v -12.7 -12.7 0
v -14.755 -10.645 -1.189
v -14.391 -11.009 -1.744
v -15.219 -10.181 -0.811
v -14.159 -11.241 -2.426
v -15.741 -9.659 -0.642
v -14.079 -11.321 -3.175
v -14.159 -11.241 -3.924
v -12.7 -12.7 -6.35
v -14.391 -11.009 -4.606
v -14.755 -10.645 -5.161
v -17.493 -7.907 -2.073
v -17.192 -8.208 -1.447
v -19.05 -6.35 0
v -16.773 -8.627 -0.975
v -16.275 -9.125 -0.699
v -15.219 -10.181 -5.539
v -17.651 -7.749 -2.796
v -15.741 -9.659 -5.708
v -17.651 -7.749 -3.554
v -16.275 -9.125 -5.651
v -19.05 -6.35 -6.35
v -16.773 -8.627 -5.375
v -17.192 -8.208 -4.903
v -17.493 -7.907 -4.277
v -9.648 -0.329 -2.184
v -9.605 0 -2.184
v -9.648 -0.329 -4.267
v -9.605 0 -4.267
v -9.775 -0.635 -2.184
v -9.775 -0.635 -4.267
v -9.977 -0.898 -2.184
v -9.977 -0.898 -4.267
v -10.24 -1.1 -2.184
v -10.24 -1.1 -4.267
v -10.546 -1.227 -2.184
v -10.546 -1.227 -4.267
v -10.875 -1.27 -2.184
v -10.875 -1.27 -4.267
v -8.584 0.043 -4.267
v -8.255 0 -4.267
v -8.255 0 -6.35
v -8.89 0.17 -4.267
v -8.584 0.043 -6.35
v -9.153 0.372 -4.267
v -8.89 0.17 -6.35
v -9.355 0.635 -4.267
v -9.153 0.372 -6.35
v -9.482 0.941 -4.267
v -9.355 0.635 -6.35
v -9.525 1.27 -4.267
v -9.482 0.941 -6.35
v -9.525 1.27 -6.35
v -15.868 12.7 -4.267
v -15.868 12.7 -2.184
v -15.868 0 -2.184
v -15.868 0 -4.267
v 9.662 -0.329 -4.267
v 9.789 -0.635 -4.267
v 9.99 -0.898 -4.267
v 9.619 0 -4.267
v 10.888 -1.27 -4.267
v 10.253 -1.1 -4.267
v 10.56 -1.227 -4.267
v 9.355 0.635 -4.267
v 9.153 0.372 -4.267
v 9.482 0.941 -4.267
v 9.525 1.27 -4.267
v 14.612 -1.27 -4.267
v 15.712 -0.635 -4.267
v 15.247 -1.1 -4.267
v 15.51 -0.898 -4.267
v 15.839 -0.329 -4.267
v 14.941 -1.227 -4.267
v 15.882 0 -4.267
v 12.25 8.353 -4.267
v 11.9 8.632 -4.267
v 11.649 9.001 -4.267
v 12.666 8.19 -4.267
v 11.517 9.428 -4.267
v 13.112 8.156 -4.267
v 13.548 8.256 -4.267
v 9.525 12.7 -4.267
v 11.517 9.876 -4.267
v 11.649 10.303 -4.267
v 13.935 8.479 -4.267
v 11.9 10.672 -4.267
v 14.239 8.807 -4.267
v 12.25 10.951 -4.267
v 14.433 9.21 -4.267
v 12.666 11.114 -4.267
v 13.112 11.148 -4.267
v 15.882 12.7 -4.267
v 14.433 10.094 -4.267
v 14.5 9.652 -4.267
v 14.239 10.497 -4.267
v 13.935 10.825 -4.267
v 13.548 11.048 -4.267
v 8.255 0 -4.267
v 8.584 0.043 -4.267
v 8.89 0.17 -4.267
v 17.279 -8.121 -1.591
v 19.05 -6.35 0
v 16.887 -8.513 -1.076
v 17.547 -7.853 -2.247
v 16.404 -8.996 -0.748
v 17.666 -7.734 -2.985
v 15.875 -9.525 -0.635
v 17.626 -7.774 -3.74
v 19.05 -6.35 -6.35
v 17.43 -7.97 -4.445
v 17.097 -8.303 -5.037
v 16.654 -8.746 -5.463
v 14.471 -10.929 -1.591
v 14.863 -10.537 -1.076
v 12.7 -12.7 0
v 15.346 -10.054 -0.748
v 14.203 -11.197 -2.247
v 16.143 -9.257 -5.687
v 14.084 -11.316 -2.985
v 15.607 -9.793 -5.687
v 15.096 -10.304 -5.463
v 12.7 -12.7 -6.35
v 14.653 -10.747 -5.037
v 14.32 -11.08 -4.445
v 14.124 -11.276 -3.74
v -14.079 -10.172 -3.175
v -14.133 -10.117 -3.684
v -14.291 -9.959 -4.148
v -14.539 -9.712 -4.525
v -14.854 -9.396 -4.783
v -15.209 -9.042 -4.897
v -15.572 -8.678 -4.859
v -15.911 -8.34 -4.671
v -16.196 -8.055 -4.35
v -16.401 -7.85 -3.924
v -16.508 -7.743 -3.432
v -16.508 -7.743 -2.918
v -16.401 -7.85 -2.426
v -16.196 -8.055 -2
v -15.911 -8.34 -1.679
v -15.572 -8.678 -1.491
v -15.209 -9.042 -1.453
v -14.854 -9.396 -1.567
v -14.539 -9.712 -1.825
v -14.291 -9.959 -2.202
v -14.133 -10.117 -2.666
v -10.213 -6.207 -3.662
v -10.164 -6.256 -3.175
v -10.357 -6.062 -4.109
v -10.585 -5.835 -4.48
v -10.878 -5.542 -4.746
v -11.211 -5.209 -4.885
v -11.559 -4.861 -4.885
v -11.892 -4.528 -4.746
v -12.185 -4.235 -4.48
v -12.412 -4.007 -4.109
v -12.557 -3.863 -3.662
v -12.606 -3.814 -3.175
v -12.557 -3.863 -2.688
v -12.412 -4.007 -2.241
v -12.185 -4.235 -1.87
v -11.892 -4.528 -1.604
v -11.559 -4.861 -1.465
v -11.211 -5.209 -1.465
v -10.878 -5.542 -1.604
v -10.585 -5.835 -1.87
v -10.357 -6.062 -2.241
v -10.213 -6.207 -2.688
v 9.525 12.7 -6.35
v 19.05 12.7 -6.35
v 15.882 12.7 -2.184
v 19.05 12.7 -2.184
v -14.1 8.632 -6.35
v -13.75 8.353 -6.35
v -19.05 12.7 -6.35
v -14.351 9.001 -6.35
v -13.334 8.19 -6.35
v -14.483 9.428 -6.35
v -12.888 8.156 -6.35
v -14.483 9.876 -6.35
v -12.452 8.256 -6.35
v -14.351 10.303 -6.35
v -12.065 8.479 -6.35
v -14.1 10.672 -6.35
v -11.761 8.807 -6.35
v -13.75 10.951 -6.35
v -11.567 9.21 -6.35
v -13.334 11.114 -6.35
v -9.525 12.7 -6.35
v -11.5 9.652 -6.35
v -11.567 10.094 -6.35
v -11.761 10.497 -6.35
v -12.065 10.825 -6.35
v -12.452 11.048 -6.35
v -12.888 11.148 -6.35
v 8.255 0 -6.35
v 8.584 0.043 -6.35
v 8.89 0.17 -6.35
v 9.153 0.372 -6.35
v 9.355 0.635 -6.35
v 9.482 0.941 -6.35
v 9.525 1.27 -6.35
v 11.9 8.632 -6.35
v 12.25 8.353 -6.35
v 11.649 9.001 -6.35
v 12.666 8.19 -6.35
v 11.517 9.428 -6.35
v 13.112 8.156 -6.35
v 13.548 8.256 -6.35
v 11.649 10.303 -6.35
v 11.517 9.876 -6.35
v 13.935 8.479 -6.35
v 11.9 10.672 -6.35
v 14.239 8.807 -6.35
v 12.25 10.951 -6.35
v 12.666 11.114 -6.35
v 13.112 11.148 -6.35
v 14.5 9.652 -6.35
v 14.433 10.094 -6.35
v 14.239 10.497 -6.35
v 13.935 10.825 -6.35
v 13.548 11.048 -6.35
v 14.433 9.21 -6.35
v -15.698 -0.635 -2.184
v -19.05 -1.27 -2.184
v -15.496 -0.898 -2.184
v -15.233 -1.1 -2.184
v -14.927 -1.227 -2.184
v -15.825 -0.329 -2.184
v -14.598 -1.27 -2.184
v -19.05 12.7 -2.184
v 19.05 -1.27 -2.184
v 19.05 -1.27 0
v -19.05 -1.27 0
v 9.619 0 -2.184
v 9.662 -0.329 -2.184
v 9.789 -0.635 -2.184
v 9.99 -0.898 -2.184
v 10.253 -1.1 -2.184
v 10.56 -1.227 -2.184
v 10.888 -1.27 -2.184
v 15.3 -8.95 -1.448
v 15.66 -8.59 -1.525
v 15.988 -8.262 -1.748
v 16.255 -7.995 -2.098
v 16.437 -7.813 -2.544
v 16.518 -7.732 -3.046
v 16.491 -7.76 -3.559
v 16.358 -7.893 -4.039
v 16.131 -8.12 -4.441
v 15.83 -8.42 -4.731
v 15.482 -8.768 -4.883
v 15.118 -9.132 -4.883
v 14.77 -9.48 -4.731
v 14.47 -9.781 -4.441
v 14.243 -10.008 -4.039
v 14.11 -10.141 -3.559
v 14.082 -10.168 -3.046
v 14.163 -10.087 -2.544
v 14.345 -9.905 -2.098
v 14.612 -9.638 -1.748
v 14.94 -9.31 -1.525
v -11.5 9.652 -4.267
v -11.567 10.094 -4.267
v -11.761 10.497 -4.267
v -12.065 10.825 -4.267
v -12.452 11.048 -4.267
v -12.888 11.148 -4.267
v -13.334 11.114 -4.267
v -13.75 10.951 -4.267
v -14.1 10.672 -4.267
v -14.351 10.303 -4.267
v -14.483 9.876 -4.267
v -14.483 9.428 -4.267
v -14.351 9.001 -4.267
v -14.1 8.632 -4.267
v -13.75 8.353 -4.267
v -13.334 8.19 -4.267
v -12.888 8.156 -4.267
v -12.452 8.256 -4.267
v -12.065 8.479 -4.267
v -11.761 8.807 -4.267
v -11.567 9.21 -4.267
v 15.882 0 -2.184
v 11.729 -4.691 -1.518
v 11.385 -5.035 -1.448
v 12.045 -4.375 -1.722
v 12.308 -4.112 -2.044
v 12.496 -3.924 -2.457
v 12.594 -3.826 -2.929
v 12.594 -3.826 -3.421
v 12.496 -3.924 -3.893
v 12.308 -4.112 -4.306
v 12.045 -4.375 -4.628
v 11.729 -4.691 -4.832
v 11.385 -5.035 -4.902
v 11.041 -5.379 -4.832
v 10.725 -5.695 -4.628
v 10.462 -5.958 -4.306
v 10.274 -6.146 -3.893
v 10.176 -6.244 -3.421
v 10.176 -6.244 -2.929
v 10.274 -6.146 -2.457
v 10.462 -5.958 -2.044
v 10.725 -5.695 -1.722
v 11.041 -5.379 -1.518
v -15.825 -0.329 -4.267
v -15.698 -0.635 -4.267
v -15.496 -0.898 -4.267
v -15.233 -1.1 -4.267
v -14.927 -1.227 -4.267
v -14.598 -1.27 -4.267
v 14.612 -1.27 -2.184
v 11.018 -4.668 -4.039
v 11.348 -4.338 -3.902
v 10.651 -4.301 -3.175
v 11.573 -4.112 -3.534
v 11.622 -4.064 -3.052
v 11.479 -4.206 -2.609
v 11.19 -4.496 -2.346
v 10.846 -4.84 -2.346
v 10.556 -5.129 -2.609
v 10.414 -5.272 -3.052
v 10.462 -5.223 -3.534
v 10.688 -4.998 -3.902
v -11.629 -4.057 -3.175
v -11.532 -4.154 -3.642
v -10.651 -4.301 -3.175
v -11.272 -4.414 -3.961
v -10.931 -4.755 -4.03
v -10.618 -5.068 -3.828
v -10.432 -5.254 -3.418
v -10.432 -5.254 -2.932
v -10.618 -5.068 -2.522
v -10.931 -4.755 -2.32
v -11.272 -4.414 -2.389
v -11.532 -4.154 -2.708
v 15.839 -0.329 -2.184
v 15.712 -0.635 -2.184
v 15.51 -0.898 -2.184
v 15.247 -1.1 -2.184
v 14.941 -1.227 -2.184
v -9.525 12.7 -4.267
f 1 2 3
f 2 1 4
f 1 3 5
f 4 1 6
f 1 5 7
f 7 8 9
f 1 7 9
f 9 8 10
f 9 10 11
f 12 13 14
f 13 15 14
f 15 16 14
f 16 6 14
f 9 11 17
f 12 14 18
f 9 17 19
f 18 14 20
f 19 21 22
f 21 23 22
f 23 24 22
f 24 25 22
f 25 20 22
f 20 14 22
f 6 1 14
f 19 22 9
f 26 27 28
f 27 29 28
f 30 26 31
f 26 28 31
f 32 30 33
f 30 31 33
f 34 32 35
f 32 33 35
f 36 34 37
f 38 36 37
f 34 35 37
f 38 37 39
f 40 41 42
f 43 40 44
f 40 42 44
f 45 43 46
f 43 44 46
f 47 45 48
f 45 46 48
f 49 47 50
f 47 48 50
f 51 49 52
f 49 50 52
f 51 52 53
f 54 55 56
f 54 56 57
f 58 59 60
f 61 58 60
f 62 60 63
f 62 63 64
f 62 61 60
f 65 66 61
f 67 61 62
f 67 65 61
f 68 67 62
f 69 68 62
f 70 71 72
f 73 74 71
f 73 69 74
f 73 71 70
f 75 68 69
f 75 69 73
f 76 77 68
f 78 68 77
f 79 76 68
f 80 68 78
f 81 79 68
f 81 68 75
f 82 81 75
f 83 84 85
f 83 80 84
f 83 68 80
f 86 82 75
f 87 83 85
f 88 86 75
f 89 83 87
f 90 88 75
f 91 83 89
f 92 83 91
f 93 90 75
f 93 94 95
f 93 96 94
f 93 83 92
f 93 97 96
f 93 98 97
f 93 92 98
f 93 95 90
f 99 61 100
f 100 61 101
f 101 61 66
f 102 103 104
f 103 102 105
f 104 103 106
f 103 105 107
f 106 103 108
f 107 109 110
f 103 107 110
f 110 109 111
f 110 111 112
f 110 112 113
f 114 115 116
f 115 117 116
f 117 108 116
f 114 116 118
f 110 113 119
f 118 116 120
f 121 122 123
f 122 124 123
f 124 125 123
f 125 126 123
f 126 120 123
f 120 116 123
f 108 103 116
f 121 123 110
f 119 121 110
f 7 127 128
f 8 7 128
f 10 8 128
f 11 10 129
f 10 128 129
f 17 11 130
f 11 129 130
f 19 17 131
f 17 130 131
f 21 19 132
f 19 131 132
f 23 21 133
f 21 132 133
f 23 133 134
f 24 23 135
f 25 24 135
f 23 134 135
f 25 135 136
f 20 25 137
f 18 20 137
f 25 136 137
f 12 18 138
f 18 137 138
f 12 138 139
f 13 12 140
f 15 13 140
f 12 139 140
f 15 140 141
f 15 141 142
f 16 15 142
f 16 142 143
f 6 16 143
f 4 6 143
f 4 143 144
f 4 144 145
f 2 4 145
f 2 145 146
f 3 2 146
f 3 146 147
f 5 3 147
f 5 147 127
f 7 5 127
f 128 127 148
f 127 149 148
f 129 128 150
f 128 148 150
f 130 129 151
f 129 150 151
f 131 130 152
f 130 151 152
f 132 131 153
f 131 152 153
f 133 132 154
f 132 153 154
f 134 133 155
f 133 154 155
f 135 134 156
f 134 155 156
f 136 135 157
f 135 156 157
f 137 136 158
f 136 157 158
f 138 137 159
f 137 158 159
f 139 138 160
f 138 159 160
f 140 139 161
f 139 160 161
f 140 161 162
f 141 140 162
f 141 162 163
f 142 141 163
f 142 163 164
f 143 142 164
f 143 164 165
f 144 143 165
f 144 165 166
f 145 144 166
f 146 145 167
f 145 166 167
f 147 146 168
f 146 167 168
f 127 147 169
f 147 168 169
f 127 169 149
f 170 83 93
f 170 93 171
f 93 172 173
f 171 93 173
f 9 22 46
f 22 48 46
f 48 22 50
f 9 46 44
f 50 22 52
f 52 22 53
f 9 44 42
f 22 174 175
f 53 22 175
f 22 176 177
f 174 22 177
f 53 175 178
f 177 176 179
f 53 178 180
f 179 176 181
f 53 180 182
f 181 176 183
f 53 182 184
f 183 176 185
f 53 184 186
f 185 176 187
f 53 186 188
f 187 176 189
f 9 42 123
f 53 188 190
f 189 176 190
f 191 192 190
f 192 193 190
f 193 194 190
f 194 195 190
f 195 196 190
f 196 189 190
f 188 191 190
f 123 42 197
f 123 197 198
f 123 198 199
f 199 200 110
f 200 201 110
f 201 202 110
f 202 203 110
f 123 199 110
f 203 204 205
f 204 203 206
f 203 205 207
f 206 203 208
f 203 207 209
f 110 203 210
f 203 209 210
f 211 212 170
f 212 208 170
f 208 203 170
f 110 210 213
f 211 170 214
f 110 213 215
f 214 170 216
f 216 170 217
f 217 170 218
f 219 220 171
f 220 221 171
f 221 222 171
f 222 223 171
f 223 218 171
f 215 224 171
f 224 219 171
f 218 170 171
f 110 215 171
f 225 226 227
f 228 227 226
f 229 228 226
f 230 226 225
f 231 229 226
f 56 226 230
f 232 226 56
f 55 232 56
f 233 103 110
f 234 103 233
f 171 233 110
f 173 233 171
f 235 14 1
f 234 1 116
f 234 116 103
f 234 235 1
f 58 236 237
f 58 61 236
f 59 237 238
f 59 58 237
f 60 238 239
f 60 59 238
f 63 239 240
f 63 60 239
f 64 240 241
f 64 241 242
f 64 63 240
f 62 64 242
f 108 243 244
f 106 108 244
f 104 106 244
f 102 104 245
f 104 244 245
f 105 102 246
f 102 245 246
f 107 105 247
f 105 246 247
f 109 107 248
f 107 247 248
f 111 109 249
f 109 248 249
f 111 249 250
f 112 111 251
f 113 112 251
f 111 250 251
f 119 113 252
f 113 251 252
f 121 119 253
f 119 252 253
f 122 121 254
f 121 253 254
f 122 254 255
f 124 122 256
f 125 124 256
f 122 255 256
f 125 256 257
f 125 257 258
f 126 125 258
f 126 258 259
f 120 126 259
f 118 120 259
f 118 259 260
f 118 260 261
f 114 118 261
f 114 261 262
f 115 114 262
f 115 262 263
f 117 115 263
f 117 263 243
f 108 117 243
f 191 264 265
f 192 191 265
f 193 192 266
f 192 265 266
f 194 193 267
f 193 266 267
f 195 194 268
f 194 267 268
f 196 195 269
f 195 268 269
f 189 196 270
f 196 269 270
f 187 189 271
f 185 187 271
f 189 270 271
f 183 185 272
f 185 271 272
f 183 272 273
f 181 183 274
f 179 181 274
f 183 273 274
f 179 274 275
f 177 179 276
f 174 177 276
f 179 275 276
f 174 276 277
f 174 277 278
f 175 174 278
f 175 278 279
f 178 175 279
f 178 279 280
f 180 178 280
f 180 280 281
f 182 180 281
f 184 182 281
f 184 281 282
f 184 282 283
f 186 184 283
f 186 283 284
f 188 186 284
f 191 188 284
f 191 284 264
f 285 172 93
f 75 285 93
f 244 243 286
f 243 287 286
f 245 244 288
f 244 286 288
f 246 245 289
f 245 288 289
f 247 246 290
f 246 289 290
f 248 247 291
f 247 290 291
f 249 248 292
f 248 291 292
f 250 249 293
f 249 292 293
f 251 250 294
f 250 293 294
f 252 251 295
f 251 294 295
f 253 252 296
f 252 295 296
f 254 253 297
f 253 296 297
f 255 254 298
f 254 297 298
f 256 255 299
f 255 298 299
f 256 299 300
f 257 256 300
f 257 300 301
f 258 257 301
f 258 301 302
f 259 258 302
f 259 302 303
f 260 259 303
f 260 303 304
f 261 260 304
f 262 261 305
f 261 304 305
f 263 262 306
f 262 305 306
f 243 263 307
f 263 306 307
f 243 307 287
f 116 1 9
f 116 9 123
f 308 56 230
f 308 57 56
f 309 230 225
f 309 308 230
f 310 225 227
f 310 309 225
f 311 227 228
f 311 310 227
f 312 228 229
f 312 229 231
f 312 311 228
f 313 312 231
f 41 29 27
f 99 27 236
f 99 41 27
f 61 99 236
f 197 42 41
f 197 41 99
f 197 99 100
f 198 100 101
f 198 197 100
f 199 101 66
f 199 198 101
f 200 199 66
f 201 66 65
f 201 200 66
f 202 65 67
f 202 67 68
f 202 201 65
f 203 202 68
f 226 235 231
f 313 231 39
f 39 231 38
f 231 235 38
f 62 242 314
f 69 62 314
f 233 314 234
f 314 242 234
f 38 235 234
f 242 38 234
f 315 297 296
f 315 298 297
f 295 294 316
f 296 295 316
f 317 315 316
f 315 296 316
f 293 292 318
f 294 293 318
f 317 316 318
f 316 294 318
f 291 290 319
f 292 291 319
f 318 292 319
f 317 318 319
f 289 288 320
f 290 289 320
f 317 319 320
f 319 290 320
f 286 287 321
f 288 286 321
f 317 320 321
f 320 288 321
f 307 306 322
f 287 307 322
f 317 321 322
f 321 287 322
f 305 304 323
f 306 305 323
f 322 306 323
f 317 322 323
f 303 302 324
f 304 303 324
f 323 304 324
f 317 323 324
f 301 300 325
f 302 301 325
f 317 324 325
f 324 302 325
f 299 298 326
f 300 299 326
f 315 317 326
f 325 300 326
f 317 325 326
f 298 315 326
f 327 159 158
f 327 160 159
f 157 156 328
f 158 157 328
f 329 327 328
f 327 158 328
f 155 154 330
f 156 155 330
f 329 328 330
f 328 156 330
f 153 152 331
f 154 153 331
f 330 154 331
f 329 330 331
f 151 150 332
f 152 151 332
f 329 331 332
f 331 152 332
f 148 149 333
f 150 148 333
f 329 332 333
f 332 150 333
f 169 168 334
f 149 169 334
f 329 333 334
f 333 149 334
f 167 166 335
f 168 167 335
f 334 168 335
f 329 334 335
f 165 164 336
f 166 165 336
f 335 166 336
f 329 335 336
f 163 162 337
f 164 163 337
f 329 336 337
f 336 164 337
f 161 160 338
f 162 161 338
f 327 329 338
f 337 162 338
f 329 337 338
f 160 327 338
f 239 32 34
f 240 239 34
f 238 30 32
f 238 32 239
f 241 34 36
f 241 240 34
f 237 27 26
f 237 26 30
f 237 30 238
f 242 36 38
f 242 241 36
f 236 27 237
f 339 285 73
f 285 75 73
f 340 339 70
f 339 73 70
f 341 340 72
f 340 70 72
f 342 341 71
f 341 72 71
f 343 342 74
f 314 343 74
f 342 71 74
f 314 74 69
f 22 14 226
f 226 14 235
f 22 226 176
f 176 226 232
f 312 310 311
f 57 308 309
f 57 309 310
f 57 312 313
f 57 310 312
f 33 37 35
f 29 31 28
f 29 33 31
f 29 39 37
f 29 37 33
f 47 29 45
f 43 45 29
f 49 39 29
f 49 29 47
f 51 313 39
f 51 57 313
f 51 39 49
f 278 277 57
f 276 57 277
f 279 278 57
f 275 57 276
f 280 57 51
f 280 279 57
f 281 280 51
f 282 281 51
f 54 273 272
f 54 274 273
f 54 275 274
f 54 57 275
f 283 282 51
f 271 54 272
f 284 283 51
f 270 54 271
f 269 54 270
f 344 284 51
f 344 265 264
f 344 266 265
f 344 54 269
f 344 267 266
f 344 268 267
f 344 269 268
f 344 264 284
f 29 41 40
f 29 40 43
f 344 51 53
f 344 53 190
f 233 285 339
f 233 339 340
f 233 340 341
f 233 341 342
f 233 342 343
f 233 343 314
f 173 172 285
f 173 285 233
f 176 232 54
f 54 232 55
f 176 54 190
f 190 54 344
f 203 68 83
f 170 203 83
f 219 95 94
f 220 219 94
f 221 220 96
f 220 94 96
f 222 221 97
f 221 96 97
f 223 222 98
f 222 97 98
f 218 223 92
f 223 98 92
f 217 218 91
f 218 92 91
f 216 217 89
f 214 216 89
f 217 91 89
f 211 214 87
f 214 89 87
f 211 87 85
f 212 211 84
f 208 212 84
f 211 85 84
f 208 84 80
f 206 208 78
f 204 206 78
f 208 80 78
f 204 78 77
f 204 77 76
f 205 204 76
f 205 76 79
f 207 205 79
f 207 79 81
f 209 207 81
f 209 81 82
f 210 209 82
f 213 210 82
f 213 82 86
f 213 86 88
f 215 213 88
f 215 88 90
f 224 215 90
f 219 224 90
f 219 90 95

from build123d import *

# Parameters (mm, degrees)
SKETCH1_W                       = 38.1
SKETCH1_H                       = 25.4
BOSS_EXTRUDE1_DEPTH             = 6.35
SKETCH3_W                       = 38.1
SKETCH3_H                       = 13.97
CUT_EXTRUDE1_DEPTH              = 2.1844
SKETCH4_R                       = 1.27
CUT_EXTRUDE2_DEPTH              = 24.271113496
SKETCH6_W                       = 19.05
SKETCH6_H                       = 19.05
CUT_EXTRUDE5_DEPTH              = 24.759524406
SKETCH7_W                       = 31.75
SKETCH7_H                       = 2.0828
CUT_EXTRUDE6_DEPTH              = 12.7
CUT_EXTRUDE9_REACH              = 25.271
SKETCH10_R                      = 1.5
SKETCH15_W                      = 6.263340786
SKETCH15_H                      = 2.0828
CUT_EXTRUDE14_DEPTH             = 1.27
FILLET7_R                       = 1.27
CHAMFER10_SIZE                  = 6.35
F_8_32_TAPPED_HOLE2_D           = 3.4544
F_8_32_TAPPED_HOLE2_DEPTH       = 6.35
F_8_32_TAPPED_HOLE2_CSINK_D     = 5.08
F_8_32_TAPPED_HOLE2_CSINK_ANGLE = 90
F_8_32_TAPPED_HOLE2_TIP         = 1.037806461
F_8_32_TAPPED_HOLE3_D           = 3.4544
F_8_32_TAPPED_HOLE3_DEPTH       = 6.35
F_8_32_TAPPED_HOLE3_CSINK_D     = 5.08
F_8_32_TAPPED_HOLE3_CSINK_ANGLE = 90
F_8_32_TAPPED_HOLE3_TIP         = 1.037806461


with BuildPart() as part:
    # Sketch1 → Boss-Extrude1 (new body)
    with BuildSketch(Plane.XY):
        Rectangle(SKETCH1_W, SKETCH1_H)
    extrude(amount=-BOSS_EXTRUDE1_DEPTH)

    # Sketch3 → Cut-Extrude1 (cut)
    with BuildSketch(Plane.XY):
        with Locations((0, 5.715)):
            Rectangle(SKETCH3_W, SKETCH3_H)
    extrude(amount=-CUT_EXTRUDE1_DEPTH, mode=Mode.SUBTRACT)

    # Sketch4 → Cut-Extrude2 (cut, through all)
    with BuildSketch(Plane.XY.offset(-2.1844)):
        with Locations((-13, 9.652)):
            Circle(SKETCH4_R)
        with Locations(Location((13, 9.652, 0), (0, 0, 180))):
            Circle(SKETCH4_R)
    extrude(amount=-CUT_EXTRUDE2_DEPTH, mode=Mode.SUBTRACT)

    # Sketch6 → Cut-Extrude5 (cut, through all)
    with BuildSketch(Plane.XY):
        with Locations((0, 9.525)):
            Rectangle(SKETCH6_W, SKETCH6_H)
    extrude(amount=-CUT_EXTRUDE5_DEPTH, mode=Mode.SUBTRACT)

    # Sketch7 → Cut-Extrude6 (cut)
    with BuildSketch(Plane(origin=(0, 12.7, 0), x_dir=(1, 0, 0), z_dir=(0, 1, 0))):
        with Locations((0.006850314, 3.2258)):
            Rectangle(SKETCH7_W, SKETCH7_H)
    extrude(amount=-CUT_EXTRUDE6_DEPTH, mode=Mode.SUBTRACT)

    # Sketch10 → Cut-Extrude9 (cut, up to next)
    with BuildSketch(Plane.XY.offset(-2.1844), mode=Mode.PRIVATE) as cut_extrude9_sk1:
        with Locations((-13, 9.652)):
            Circle(SKETCH10_R)
    cut_extrude9_tool1 = extrude(cut_extrude9_sk1.sketch, amount=-CUT_EXTRUDE9_REACH, mode=Mode.PRIVATE) & part.part
    # Sketch10 → Cut-Extrude9 (cut, up to next)
    with BuildSketch(Plane.XY.offset(-2.1844), mode=Mode.PRIVATE) as cut_extrude9_sk2:
        with Locations((13, 9.652)):
            Circle(SKETCH10_R)
    cut_extrude9_tool2 = extrude(cut_extrude9_sk2.sketch, amount=-CUT_EXTRUDE9_REACH, mode=Mode.PRIVATE) & part.part
    add(cut_extrude9_tool1.solids().sort_by_distance((-13, 9.652, -2.1844))[0], mode=Mode.SUBTRACT)
    add(cut_extrude9_tool2.solids().sort_by_distance((13, 9.652, -2.1844))[0], mode=Mode.SUBTRACT)

    # Sketch15 → Cut-Extrude14 (cut)
    with BuildSketch(Plane(origin=(0, 0, 0), x_dir=(1, 0, 0), z_dir=(0, 1, 0))):
        with Locations((-12.736479293, 3.2258)):
            Rectangle(SKETCH15_W, SKETCH15_H)
        with Locations((12.750179921, 3.2258)):
            Rectangle(SKETCH15_W, SKETCH15_H)
    extrude(amount=-CUT_EXTRUDE14_DEPTH, mode=Mode.SUBTRACT)

    # Fillet7
    fillet7_edges = [part.edges().sort_by_distance(p)[0] for p in [
        (15.881850314, -1.27, -3.2258),
        (-15.868149686, -1.27, -3.2258),
        (-9.525, 0, -5.3086),
        (9.525, 0, -5.3086),
        (-9.6048089, -1.27, -3.2258),
        (9.618509528, -1.27, -3.2258),
    ]]
    fillet(fillet7_edges, radius=FILLET7_R - 0.0001)  # a hair under: the kernel refuses the full size

    # Chamfer10
    chamfer10_edges = [part.edges().sort_by_distance(p)[0] for p in [
        (19.05, -12.7, -3.175),
        (-19.05, -12.7, -3.175),
    ]]
    chamfer(chamfer10_edges, length=CHAMFER10_SIZE)

    # #8-32 Tapped Hole2
    with Locations(Plane(origin=(-12.7, -12.7, 0), x_dir=(-0.7071067811865487, 0.7071067811865465, 0), z_dir=(-0.7071067811865465, -0.7071067811865487, 0))):
        with Locations((4.490128061, 3.175)):
            CounterSinkHole(F_8_32_TAPPED_HOLE2_D / 2, F_8_32_TAPPED_HOLE2_CSINK_D / 2, depth=F_8_32_TAPPED_HOLE2_DEPTH, counter_sink_angle=F_8_32_TAPPED_HOLE2_CSINK_ANGLE)
            with Locations((0, 0, -(F_8_32_TAPPED_HOLE2_DEPTH + F_8_32_TAPPED_HOLE2_TIP / 2))):  # 118° drill point
                Cone(0, F_8_32_TAPPED_HOLE2_D / 2, F_8_32_TAPPED_HOLE2_TIP, mode=Mode.SUBTRACT)

    # #8-32 Tapped Hole3
    with Locations(Plane(origin=(12.7, -12.7, 0), x_dir=(0, 0, -1), z_dir=(0.707106781186549, -0.7071067811865461, 0))):
        with Locations((3.175, 4.490128061)):
            CounterSinkHole(F_8_32_TAPPED_HOLE3_D / 2, F_8_32_TAPPED_HOLE3_CSINK_D / 2, depth=F_8_32_TAPPED_HOLE3_DEPTH, counter_sink_angle=F_8_32_TAPPED_HOLE3_CSINK_ANGLE)
            with Locations((0, 0, -(F_8_32_TAPPED_HOLE3_DEPTH + F_8_32_TAPPED_HOLE3_TIP / 2))):  # 118° drill point
                Cone(0, F_8_32_TAPPED_HOLE3_D / 2, F_8_32_TAPPED_HOLE3_TIP, mode=Mode.SUBTRACT)


solid = part.part
